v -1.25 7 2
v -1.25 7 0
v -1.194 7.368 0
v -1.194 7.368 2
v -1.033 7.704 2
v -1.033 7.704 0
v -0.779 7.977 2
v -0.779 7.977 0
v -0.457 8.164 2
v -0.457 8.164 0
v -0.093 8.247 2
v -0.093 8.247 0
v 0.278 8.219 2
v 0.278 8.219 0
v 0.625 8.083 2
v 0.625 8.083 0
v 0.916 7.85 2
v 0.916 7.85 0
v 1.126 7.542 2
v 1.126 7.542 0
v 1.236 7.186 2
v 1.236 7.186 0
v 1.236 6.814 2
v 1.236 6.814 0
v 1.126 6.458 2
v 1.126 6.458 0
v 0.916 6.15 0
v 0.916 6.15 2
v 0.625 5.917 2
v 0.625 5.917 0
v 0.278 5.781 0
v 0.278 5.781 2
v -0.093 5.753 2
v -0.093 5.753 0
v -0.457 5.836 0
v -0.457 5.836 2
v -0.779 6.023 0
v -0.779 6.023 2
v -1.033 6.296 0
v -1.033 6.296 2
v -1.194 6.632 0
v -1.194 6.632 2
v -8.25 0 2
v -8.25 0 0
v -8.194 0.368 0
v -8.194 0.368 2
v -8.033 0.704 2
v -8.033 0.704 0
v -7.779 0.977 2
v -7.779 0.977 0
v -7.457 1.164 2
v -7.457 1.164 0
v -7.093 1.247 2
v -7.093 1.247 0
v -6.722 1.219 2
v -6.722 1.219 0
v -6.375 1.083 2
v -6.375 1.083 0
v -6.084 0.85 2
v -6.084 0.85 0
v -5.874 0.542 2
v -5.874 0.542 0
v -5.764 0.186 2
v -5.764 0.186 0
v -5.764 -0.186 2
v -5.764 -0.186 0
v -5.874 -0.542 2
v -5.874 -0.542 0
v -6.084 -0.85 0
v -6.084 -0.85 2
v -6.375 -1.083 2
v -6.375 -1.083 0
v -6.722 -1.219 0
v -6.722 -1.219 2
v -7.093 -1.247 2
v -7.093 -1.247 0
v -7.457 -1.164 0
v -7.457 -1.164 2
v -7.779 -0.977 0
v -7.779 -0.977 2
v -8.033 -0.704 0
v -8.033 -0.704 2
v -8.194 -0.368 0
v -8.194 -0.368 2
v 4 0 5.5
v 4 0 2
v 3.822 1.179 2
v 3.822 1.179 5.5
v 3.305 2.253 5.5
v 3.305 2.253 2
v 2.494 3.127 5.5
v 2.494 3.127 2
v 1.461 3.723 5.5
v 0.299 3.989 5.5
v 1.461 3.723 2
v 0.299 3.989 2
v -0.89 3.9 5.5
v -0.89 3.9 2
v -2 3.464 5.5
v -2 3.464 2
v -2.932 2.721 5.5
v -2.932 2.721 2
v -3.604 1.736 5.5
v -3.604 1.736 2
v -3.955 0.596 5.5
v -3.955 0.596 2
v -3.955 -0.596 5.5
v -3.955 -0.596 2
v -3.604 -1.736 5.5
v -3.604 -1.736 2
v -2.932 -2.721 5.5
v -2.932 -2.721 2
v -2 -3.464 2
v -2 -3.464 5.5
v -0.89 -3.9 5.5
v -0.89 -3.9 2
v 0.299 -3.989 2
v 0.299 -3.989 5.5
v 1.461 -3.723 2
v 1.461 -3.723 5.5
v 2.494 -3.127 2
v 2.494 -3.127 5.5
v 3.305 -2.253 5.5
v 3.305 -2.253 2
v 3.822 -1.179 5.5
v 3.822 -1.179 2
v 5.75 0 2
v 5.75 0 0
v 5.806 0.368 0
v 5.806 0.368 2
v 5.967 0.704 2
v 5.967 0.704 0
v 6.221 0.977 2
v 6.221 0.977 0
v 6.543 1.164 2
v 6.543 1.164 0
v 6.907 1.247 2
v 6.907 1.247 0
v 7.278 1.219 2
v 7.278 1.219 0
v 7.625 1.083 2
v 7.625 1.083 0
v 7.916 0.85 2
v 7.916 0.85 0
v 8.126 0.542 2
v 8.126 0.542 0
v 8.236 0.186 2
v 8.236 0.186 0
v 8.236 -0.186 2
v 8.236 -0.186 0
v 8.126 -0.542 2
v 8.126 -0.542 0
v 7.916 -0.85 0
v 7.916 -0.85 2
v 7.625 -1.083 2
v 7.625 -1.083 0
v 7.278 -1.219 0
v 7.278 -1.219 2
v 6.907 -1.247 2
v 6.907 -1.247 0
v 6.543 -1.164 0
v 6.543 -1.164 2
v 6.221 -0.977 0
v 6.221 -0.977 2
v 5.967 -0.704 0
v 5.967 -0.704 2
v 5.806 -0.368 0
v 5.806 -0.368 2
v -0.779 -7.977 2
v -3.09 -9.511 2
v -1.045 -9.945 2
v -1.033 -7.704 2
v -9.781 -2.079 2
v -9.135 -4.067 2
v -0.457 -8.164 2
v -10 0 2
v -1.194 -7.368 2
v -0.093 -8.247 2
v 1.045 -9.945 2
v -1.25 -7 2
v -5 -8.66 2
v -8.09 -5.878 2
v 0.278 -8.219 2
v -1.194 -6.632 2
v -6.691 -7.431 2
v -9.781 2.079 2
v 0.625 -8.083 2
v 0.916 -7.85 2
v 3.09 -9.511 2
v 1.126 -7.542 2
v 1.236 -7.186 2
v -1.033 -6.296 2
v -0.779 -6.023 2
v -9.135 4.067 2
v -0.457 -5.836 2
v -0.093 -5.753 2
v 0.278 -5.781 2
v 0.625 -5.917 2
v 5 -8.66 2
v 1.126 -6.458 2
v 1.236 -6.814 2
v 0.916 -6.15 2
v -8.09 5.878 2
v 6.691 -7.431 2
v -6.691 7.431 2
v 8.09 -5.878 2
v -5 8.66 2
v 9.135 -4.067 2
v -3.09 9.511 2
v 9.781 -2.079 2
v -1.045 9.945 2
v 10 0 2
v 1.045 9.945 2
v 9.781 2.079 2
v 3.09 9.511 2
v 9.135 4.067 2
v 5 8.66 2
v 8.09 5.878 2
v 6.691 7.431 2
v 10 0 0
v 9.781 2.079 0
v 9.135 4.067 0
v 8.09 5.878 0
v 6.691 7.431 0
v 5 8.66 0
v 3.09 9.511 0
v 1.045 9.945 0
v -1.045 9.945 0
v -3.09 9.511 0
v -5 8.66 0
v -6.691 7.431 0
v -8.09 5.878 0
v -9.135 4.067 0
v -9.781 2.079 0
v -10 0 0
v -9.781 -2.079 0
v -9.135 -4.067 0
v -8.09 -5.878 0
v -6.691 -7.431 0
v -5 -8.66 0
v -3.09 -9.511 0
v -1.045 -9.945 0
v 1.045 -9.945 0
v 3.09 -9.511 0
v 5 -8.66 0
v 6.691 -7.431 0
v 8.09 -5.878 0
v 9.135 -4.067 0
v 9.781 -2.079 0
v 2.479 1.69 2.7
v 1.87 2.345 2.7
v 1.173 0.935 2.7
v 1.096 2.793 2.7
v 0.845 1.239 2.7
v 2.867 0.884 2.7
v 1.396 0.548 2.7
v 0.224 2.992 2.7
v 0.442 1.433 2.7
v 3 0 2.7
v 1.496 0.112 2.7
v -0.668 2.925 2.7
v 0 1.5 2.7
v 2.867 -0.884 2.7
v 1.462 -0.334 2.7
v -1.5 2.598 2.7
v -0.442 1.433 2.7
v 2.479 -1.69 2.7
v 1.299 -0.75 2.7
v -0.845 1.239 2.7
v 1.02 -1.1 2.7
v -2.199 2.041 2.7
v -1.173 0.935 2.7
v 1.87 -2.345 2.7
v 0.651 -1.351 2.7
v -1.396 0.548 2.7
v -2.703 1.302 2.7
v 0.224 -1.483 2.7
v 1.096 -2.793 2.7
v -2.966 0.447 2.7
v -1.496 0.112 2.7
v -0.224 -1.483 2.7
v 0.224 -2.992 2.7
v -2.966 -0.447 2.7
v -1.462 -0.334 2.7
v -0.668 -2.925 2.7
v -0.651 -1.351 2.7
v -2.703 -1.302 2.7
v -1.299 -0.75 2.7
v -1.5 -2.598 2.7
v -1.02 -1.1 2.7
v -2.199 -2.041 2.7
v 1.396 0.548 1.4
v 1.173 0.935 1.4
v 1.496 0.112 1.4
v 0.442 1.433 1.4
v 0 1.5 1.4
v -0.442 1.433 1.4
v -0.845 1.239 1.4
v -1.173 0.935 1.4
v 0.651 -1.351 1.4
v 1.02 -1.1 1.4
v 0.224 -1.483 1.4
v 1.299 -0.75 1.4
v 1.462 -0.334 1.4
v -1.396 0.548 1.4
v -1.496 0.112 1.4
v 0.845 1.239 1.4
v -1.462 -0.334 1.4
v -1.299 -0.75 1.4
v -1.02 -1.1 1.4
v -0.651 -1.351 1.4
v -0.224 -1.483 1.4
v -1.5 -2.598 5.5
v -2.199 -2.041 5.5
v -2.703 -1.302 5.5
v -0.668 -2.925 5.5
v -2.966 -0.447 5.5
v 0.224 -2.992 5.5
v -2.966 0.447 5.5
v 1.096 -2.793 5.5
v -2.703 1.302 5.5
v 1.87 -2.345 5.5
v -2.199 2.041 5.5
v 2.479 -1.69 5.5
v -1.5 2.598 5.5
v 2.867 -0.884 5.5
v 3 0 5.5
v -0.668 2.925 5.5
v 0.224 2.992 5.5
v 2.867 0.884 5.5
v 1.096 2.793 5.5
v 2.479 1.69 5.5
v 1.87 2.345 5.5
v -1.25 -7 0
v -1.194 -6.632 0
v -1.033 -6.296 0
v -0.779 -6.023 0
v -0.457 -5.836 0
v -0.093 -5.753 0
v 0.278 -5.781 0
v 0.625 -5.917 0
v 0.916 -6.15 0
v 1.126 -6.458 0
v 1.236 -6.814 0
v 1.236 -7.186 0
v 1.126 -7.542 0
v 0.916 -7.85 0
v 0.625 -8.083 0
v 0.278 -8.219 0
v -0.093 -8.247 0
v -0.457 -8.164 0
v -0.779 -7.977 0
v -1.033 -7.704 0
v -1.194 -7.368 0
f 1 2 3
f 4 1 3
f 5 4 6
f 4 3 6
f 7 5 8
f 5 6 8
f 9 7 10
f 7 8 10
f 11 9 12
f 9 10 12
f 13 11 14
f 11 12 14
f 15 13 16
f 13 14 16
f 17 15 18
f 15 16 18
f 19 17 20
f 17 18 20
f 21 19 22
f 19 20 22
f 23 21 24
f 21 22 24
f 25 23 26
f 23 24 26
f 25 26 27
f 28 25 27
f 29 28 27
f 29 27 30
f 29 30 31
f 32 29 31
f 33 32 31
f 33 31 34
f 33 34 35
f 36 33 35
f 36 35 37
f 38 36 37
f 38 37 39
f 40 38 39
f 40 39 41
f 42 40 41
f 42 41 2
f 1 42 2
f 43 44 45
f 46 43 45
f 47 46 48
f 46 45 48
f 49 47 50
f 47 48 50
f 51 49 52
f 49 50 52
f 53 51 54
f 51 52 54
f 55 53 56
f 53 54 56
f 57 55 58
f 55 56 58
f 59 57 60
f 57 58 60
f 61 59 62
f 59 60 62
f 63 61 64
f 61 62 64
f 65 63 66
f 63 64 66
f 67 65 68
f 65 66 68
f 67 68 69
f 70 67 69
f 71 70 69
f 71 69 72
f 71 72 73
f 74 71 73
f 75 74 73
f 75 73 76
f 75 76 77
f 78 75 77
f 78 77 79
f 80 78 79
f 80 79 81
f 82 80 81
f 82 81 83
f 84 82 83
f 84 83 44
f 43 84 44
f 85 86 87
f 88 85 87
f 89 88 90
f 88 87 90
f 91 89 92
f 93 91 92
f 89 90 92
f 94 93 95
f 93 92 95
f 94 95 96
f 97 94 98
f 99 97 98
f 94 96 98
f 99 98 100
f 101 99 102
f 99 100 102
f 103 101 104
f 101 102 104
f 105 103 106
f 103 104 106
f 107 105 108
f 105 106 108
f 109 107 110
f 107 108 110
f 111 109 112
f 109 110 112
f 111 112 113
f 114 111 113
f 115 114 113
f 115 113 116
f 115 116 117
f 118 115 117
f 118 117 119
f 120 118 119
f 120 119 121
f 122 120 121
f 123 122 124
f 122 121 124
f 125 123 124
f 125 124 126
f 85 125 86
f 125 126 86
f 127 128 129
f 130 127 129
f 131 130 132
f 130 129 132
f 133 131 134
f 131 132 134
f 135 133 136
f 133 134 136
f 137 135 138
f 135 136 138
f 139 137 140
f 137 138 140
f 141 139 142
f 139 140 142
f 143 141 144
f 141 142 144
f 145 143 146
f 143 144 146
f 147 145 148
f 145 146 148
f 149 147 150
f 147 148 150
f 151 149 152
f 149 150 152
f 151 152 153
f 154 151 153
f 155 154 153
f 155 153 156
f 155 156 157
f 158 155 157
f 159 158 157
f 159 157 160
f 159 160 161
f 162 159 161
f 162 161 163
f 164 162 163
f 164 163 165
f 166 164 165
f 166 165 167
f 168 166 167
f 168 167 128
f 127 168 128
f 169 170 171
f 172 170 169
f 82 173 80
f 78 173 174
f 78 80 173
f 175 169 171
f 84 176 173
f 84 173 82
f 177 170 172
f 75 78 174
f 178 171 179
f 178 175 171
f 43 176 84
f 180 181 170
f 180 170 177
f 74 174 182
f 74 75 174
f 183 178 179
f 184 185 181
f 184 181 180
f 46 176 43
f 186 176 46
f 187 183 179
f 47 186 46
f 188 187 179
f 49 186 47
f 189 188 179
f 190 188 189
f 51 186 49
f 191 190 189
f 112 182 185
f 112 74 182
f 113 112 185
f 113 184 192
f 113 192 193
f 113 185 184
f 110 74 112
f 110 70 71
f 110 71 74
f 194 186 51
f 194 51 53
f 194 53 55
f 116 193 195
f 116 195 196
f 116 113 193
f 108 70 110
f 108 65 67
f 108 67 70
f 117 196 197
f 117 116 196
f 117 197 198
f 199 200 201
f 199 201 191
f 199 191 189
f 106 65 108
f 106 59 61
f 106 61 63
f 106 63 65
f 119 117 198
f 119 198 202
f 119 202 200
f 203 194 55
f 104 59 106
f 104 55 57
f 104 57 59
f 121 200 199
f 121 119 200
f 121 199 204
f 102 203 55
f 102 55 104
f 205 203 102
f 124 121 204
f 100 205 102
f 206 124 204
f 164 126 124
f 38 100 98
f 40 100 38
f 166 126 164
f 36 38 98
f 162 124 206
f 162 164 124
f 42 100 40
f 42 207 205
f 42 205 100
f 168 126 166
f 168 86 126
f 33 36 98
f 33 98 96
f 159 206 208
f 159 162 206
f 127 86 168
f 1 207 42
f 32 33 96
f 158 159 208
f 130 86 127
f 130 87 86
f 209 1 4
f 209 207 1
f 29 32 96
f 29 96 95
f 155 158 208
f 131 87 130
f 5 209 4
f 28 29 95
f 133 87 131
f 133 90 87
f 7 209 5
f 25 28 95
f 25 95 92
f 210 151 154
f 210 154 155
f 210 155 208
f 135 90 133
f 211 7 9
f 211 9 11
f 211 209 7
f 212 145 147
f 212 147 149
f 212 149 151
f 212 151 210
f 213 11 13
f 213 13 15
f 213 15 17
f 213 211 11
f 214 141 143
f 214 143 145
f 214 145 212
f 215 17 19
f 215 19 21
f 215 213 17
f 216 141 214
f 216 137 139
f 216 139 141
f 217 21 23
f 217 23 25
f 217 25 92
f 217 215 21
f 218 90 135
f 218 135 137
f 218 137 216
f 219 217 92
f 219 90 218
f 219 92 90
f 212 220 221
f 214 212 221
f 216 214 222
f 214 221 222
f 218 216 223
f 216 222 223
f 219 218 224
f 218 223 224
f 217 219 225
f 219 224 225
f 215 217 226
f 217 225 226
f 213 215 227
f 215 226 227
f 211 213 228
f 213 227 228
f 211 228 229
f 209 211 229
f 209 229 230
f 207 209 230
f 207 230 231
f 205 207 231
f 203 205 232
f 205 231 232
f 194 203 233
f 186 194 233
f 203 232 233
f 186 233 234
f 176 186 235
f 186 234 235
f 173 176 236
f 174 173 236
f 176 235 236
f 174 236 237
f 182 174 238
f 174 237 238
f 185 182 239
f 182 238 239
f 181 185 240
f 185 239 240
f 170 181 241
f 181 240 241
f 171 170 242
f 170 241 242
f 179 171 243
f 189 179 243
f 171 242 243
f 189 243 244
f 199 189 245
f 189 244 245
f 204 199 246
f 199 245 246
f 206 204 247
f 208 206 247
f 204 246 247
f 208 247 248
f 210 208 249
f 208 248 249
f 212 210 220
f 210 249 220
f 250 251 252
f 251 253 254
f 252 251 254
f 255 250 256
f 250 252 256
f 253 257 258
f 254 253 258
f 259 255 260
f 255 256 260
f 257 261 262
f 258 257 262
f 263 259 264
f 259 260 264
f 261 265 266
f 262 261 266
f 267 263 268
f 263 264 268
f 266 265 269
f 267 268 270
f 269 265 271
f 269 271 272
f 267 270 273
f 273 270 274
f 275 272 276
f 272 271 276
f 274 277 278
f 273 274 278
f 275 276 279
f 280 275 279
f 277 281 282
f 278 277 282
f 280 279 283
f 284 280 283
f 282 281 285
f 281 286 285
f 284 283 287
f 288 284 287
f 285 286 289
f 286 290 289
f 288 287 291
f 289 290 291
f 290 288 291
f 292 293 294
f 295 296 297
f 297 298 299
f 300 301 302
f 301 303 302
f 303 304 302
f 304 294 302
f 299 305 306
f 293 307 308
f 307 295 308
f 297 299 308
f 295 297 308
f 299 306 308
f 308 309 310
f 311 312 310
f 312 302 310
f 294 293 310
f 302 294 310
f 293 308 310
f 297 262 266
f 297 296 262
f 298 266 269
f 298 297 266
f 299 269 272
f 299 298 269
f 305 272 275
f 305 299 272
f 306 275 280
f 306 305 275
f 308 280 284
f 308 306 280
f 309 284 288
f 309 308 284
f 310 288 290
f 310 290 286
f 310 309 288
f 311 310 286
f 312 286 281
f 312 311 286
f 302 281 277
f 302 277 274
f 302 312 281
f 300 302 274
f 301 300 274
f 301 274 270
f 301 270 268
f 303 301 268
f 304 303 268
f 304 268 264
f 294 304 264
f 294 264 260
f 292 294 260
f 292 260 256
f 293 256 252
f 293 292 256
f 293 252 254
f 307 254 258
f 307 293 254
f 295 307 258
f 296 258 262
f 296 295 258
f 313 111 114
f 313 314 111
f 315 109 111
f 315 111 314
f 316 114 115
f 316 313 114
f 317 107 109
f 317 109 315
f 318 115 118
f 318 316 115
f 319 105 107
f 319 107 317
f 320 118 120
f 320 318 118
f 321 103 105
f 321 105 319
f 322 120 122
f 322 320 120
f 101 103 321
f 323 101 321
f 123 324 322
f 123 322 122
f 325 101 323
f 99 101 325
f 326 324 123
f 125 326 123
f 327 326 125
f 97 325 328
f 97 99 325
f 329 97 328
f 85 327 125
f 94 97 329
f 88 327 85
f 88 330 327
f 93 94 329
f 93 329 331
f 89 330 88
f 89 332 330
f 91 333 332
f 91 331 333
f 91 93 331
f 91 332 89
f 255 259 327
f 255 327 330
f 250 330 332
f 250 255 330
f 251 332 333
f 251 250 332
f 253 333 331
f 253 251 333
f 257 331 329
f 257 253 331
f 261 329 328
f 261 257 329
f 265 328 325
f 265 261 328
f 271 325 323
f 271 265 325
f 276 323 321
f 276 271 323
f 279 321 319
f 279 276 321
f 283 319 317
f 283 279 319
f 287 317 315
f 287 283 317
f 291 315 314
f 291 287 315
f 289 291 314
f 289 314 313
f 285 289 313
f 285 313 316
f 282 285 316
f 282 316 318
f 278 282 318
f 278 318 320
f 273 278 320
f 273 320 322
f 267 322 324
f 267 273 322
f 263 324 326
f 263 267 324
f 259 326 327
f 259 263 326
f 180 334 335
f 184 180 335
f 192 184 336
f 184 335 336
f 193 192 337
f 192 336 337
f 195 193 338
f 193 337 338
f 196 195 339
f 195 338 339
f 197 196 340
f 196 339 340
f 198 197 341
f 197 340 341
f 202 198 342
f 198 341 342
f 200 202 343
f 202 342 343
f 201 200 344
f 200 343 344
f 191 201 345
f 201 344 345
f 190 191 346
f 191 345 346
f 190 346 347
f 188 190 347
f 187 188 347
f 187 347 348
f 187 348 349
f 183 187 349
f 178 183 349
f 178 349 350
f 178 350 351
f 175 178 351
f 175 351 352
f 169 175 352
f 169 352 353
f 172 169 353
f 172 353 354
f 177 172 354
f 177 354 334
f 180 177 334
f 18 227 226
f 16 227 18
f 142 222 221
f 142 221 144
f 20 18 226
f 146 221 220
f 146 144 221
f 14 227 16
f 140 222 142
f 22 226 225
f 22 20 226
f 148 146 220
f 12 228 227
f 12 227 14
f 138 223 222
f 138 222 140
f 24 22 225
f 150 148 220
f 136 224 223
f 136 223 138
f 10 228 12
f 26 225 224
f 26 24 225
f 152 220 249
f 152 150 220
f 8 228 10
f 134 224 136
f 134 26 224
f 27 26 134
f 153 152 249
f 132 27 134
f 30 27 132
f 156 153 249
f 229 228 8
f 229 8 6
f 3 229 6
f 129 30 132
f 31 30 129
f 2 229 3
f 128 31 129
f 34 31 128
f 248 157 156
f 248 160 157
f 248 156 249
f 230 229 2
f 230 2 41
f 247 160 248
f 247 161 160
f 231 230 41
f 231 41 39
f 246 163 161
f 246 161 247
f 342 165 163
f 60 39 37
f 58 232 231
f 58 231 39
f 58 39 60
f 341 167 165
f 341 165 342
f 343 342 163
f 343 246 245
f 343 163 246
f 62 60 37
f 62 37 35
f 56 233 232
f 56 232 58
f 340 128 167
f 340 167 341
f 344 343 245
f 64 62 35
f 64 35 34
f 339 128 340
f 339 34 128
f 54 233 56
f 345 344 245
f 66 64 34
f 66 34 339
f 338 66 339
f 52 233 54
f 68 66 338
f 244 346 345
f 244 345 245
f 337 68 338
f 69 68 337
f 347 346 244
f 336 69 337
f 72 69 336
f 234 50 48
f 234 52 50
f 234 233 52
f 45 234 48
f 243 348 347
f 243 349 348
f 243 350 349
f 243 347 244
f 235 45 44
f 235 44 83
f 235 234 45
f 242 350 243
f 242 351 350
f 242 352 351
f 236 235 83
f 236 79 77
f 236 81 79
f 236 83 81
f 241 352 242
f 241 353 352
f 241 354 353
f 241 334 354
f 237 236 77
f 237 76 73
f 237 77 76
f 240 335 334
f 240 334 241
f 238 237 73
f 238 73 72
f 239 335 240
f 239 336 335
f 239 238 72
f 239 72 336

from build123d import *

# Parameters (mm, degrees)
SKETCH_1_R         = 10
SKETCH_1_R_2       = 3
EXTRUDE_1_DEPTH    = 2
SKETCH_2_R         = 4
SKETCH_2_R_2       = 3
EXTRUDE_1_2_DEPTH  = 3.5
HOLE_WIZARD_M3_1_D = 2.5
SKETCH_6_W         = 1.3
SKETCH_6_H         = 1.5
EXTRUDE_START      = 1.4
SKETCH_7_R         = 3
EXTRUDE_2_DEPTH    = 1.4


with BuildPart() as part:
    # 草图1 → Extrude 1 (new body)
    with BuildSketch(Plane.XY):
        Circle(SKETCH_1_R)
        Circle(SKETCH_1_R_2, mode=Mode.SUBTRACT)
    extrude(amount=EXTRUDE_1_DEPTH)

    # 草图2 → Extrude 1 2 (add)
    with BuildSketch(Plane.XY.offset(2)):
        Circle(SKETCH_2_R)
        Circle(SKETCH_2_R_2, mode=Mode.SUBTRACT)
    extrude(amount=EXTRUDE_1_2_DEPTH)

    # M3 螺纹孔1 (through all)
    with Locations(Plane(origin=(-7, 0, 2), x_dir=(1, 0, 0), z_dir=(0, 0, 1))):
        with Locations((0, 0), (7, 7), (14, 0), (7, -7)):
            Hole(HOLE_WIZARD_M3_1_D / 2)

    # 草图6 → 旋转1 (revolve)
    with BuildSketch(Plane(origin=(0, 0, 0), x_dir=(0, 0, -1), z_dir=(1, 0, 0))):
        with Locations((-2.05, 2.25)):
            Rectangle(SKETCH_6_W, SKETCH_6_H)
    revolve(axis=Axis((0, 0, 0), (0, 0, 1)))

    # 草图7 → 凸台-拉伸2 (add)
    with BuildSketch(Plane(origin=(0, 0, 1.4), x_dir=(-1, 0, 0), z_dir=(0, 0, -1)).offset(EXTRUDE_START)):
        with Locations(Location((0, 0, 0), (0, 0, 270))):
            Circle(SKETCH_7_R)
    extrude(amount=-EXTRUDE_2_DEPTH)


solid = part.part
